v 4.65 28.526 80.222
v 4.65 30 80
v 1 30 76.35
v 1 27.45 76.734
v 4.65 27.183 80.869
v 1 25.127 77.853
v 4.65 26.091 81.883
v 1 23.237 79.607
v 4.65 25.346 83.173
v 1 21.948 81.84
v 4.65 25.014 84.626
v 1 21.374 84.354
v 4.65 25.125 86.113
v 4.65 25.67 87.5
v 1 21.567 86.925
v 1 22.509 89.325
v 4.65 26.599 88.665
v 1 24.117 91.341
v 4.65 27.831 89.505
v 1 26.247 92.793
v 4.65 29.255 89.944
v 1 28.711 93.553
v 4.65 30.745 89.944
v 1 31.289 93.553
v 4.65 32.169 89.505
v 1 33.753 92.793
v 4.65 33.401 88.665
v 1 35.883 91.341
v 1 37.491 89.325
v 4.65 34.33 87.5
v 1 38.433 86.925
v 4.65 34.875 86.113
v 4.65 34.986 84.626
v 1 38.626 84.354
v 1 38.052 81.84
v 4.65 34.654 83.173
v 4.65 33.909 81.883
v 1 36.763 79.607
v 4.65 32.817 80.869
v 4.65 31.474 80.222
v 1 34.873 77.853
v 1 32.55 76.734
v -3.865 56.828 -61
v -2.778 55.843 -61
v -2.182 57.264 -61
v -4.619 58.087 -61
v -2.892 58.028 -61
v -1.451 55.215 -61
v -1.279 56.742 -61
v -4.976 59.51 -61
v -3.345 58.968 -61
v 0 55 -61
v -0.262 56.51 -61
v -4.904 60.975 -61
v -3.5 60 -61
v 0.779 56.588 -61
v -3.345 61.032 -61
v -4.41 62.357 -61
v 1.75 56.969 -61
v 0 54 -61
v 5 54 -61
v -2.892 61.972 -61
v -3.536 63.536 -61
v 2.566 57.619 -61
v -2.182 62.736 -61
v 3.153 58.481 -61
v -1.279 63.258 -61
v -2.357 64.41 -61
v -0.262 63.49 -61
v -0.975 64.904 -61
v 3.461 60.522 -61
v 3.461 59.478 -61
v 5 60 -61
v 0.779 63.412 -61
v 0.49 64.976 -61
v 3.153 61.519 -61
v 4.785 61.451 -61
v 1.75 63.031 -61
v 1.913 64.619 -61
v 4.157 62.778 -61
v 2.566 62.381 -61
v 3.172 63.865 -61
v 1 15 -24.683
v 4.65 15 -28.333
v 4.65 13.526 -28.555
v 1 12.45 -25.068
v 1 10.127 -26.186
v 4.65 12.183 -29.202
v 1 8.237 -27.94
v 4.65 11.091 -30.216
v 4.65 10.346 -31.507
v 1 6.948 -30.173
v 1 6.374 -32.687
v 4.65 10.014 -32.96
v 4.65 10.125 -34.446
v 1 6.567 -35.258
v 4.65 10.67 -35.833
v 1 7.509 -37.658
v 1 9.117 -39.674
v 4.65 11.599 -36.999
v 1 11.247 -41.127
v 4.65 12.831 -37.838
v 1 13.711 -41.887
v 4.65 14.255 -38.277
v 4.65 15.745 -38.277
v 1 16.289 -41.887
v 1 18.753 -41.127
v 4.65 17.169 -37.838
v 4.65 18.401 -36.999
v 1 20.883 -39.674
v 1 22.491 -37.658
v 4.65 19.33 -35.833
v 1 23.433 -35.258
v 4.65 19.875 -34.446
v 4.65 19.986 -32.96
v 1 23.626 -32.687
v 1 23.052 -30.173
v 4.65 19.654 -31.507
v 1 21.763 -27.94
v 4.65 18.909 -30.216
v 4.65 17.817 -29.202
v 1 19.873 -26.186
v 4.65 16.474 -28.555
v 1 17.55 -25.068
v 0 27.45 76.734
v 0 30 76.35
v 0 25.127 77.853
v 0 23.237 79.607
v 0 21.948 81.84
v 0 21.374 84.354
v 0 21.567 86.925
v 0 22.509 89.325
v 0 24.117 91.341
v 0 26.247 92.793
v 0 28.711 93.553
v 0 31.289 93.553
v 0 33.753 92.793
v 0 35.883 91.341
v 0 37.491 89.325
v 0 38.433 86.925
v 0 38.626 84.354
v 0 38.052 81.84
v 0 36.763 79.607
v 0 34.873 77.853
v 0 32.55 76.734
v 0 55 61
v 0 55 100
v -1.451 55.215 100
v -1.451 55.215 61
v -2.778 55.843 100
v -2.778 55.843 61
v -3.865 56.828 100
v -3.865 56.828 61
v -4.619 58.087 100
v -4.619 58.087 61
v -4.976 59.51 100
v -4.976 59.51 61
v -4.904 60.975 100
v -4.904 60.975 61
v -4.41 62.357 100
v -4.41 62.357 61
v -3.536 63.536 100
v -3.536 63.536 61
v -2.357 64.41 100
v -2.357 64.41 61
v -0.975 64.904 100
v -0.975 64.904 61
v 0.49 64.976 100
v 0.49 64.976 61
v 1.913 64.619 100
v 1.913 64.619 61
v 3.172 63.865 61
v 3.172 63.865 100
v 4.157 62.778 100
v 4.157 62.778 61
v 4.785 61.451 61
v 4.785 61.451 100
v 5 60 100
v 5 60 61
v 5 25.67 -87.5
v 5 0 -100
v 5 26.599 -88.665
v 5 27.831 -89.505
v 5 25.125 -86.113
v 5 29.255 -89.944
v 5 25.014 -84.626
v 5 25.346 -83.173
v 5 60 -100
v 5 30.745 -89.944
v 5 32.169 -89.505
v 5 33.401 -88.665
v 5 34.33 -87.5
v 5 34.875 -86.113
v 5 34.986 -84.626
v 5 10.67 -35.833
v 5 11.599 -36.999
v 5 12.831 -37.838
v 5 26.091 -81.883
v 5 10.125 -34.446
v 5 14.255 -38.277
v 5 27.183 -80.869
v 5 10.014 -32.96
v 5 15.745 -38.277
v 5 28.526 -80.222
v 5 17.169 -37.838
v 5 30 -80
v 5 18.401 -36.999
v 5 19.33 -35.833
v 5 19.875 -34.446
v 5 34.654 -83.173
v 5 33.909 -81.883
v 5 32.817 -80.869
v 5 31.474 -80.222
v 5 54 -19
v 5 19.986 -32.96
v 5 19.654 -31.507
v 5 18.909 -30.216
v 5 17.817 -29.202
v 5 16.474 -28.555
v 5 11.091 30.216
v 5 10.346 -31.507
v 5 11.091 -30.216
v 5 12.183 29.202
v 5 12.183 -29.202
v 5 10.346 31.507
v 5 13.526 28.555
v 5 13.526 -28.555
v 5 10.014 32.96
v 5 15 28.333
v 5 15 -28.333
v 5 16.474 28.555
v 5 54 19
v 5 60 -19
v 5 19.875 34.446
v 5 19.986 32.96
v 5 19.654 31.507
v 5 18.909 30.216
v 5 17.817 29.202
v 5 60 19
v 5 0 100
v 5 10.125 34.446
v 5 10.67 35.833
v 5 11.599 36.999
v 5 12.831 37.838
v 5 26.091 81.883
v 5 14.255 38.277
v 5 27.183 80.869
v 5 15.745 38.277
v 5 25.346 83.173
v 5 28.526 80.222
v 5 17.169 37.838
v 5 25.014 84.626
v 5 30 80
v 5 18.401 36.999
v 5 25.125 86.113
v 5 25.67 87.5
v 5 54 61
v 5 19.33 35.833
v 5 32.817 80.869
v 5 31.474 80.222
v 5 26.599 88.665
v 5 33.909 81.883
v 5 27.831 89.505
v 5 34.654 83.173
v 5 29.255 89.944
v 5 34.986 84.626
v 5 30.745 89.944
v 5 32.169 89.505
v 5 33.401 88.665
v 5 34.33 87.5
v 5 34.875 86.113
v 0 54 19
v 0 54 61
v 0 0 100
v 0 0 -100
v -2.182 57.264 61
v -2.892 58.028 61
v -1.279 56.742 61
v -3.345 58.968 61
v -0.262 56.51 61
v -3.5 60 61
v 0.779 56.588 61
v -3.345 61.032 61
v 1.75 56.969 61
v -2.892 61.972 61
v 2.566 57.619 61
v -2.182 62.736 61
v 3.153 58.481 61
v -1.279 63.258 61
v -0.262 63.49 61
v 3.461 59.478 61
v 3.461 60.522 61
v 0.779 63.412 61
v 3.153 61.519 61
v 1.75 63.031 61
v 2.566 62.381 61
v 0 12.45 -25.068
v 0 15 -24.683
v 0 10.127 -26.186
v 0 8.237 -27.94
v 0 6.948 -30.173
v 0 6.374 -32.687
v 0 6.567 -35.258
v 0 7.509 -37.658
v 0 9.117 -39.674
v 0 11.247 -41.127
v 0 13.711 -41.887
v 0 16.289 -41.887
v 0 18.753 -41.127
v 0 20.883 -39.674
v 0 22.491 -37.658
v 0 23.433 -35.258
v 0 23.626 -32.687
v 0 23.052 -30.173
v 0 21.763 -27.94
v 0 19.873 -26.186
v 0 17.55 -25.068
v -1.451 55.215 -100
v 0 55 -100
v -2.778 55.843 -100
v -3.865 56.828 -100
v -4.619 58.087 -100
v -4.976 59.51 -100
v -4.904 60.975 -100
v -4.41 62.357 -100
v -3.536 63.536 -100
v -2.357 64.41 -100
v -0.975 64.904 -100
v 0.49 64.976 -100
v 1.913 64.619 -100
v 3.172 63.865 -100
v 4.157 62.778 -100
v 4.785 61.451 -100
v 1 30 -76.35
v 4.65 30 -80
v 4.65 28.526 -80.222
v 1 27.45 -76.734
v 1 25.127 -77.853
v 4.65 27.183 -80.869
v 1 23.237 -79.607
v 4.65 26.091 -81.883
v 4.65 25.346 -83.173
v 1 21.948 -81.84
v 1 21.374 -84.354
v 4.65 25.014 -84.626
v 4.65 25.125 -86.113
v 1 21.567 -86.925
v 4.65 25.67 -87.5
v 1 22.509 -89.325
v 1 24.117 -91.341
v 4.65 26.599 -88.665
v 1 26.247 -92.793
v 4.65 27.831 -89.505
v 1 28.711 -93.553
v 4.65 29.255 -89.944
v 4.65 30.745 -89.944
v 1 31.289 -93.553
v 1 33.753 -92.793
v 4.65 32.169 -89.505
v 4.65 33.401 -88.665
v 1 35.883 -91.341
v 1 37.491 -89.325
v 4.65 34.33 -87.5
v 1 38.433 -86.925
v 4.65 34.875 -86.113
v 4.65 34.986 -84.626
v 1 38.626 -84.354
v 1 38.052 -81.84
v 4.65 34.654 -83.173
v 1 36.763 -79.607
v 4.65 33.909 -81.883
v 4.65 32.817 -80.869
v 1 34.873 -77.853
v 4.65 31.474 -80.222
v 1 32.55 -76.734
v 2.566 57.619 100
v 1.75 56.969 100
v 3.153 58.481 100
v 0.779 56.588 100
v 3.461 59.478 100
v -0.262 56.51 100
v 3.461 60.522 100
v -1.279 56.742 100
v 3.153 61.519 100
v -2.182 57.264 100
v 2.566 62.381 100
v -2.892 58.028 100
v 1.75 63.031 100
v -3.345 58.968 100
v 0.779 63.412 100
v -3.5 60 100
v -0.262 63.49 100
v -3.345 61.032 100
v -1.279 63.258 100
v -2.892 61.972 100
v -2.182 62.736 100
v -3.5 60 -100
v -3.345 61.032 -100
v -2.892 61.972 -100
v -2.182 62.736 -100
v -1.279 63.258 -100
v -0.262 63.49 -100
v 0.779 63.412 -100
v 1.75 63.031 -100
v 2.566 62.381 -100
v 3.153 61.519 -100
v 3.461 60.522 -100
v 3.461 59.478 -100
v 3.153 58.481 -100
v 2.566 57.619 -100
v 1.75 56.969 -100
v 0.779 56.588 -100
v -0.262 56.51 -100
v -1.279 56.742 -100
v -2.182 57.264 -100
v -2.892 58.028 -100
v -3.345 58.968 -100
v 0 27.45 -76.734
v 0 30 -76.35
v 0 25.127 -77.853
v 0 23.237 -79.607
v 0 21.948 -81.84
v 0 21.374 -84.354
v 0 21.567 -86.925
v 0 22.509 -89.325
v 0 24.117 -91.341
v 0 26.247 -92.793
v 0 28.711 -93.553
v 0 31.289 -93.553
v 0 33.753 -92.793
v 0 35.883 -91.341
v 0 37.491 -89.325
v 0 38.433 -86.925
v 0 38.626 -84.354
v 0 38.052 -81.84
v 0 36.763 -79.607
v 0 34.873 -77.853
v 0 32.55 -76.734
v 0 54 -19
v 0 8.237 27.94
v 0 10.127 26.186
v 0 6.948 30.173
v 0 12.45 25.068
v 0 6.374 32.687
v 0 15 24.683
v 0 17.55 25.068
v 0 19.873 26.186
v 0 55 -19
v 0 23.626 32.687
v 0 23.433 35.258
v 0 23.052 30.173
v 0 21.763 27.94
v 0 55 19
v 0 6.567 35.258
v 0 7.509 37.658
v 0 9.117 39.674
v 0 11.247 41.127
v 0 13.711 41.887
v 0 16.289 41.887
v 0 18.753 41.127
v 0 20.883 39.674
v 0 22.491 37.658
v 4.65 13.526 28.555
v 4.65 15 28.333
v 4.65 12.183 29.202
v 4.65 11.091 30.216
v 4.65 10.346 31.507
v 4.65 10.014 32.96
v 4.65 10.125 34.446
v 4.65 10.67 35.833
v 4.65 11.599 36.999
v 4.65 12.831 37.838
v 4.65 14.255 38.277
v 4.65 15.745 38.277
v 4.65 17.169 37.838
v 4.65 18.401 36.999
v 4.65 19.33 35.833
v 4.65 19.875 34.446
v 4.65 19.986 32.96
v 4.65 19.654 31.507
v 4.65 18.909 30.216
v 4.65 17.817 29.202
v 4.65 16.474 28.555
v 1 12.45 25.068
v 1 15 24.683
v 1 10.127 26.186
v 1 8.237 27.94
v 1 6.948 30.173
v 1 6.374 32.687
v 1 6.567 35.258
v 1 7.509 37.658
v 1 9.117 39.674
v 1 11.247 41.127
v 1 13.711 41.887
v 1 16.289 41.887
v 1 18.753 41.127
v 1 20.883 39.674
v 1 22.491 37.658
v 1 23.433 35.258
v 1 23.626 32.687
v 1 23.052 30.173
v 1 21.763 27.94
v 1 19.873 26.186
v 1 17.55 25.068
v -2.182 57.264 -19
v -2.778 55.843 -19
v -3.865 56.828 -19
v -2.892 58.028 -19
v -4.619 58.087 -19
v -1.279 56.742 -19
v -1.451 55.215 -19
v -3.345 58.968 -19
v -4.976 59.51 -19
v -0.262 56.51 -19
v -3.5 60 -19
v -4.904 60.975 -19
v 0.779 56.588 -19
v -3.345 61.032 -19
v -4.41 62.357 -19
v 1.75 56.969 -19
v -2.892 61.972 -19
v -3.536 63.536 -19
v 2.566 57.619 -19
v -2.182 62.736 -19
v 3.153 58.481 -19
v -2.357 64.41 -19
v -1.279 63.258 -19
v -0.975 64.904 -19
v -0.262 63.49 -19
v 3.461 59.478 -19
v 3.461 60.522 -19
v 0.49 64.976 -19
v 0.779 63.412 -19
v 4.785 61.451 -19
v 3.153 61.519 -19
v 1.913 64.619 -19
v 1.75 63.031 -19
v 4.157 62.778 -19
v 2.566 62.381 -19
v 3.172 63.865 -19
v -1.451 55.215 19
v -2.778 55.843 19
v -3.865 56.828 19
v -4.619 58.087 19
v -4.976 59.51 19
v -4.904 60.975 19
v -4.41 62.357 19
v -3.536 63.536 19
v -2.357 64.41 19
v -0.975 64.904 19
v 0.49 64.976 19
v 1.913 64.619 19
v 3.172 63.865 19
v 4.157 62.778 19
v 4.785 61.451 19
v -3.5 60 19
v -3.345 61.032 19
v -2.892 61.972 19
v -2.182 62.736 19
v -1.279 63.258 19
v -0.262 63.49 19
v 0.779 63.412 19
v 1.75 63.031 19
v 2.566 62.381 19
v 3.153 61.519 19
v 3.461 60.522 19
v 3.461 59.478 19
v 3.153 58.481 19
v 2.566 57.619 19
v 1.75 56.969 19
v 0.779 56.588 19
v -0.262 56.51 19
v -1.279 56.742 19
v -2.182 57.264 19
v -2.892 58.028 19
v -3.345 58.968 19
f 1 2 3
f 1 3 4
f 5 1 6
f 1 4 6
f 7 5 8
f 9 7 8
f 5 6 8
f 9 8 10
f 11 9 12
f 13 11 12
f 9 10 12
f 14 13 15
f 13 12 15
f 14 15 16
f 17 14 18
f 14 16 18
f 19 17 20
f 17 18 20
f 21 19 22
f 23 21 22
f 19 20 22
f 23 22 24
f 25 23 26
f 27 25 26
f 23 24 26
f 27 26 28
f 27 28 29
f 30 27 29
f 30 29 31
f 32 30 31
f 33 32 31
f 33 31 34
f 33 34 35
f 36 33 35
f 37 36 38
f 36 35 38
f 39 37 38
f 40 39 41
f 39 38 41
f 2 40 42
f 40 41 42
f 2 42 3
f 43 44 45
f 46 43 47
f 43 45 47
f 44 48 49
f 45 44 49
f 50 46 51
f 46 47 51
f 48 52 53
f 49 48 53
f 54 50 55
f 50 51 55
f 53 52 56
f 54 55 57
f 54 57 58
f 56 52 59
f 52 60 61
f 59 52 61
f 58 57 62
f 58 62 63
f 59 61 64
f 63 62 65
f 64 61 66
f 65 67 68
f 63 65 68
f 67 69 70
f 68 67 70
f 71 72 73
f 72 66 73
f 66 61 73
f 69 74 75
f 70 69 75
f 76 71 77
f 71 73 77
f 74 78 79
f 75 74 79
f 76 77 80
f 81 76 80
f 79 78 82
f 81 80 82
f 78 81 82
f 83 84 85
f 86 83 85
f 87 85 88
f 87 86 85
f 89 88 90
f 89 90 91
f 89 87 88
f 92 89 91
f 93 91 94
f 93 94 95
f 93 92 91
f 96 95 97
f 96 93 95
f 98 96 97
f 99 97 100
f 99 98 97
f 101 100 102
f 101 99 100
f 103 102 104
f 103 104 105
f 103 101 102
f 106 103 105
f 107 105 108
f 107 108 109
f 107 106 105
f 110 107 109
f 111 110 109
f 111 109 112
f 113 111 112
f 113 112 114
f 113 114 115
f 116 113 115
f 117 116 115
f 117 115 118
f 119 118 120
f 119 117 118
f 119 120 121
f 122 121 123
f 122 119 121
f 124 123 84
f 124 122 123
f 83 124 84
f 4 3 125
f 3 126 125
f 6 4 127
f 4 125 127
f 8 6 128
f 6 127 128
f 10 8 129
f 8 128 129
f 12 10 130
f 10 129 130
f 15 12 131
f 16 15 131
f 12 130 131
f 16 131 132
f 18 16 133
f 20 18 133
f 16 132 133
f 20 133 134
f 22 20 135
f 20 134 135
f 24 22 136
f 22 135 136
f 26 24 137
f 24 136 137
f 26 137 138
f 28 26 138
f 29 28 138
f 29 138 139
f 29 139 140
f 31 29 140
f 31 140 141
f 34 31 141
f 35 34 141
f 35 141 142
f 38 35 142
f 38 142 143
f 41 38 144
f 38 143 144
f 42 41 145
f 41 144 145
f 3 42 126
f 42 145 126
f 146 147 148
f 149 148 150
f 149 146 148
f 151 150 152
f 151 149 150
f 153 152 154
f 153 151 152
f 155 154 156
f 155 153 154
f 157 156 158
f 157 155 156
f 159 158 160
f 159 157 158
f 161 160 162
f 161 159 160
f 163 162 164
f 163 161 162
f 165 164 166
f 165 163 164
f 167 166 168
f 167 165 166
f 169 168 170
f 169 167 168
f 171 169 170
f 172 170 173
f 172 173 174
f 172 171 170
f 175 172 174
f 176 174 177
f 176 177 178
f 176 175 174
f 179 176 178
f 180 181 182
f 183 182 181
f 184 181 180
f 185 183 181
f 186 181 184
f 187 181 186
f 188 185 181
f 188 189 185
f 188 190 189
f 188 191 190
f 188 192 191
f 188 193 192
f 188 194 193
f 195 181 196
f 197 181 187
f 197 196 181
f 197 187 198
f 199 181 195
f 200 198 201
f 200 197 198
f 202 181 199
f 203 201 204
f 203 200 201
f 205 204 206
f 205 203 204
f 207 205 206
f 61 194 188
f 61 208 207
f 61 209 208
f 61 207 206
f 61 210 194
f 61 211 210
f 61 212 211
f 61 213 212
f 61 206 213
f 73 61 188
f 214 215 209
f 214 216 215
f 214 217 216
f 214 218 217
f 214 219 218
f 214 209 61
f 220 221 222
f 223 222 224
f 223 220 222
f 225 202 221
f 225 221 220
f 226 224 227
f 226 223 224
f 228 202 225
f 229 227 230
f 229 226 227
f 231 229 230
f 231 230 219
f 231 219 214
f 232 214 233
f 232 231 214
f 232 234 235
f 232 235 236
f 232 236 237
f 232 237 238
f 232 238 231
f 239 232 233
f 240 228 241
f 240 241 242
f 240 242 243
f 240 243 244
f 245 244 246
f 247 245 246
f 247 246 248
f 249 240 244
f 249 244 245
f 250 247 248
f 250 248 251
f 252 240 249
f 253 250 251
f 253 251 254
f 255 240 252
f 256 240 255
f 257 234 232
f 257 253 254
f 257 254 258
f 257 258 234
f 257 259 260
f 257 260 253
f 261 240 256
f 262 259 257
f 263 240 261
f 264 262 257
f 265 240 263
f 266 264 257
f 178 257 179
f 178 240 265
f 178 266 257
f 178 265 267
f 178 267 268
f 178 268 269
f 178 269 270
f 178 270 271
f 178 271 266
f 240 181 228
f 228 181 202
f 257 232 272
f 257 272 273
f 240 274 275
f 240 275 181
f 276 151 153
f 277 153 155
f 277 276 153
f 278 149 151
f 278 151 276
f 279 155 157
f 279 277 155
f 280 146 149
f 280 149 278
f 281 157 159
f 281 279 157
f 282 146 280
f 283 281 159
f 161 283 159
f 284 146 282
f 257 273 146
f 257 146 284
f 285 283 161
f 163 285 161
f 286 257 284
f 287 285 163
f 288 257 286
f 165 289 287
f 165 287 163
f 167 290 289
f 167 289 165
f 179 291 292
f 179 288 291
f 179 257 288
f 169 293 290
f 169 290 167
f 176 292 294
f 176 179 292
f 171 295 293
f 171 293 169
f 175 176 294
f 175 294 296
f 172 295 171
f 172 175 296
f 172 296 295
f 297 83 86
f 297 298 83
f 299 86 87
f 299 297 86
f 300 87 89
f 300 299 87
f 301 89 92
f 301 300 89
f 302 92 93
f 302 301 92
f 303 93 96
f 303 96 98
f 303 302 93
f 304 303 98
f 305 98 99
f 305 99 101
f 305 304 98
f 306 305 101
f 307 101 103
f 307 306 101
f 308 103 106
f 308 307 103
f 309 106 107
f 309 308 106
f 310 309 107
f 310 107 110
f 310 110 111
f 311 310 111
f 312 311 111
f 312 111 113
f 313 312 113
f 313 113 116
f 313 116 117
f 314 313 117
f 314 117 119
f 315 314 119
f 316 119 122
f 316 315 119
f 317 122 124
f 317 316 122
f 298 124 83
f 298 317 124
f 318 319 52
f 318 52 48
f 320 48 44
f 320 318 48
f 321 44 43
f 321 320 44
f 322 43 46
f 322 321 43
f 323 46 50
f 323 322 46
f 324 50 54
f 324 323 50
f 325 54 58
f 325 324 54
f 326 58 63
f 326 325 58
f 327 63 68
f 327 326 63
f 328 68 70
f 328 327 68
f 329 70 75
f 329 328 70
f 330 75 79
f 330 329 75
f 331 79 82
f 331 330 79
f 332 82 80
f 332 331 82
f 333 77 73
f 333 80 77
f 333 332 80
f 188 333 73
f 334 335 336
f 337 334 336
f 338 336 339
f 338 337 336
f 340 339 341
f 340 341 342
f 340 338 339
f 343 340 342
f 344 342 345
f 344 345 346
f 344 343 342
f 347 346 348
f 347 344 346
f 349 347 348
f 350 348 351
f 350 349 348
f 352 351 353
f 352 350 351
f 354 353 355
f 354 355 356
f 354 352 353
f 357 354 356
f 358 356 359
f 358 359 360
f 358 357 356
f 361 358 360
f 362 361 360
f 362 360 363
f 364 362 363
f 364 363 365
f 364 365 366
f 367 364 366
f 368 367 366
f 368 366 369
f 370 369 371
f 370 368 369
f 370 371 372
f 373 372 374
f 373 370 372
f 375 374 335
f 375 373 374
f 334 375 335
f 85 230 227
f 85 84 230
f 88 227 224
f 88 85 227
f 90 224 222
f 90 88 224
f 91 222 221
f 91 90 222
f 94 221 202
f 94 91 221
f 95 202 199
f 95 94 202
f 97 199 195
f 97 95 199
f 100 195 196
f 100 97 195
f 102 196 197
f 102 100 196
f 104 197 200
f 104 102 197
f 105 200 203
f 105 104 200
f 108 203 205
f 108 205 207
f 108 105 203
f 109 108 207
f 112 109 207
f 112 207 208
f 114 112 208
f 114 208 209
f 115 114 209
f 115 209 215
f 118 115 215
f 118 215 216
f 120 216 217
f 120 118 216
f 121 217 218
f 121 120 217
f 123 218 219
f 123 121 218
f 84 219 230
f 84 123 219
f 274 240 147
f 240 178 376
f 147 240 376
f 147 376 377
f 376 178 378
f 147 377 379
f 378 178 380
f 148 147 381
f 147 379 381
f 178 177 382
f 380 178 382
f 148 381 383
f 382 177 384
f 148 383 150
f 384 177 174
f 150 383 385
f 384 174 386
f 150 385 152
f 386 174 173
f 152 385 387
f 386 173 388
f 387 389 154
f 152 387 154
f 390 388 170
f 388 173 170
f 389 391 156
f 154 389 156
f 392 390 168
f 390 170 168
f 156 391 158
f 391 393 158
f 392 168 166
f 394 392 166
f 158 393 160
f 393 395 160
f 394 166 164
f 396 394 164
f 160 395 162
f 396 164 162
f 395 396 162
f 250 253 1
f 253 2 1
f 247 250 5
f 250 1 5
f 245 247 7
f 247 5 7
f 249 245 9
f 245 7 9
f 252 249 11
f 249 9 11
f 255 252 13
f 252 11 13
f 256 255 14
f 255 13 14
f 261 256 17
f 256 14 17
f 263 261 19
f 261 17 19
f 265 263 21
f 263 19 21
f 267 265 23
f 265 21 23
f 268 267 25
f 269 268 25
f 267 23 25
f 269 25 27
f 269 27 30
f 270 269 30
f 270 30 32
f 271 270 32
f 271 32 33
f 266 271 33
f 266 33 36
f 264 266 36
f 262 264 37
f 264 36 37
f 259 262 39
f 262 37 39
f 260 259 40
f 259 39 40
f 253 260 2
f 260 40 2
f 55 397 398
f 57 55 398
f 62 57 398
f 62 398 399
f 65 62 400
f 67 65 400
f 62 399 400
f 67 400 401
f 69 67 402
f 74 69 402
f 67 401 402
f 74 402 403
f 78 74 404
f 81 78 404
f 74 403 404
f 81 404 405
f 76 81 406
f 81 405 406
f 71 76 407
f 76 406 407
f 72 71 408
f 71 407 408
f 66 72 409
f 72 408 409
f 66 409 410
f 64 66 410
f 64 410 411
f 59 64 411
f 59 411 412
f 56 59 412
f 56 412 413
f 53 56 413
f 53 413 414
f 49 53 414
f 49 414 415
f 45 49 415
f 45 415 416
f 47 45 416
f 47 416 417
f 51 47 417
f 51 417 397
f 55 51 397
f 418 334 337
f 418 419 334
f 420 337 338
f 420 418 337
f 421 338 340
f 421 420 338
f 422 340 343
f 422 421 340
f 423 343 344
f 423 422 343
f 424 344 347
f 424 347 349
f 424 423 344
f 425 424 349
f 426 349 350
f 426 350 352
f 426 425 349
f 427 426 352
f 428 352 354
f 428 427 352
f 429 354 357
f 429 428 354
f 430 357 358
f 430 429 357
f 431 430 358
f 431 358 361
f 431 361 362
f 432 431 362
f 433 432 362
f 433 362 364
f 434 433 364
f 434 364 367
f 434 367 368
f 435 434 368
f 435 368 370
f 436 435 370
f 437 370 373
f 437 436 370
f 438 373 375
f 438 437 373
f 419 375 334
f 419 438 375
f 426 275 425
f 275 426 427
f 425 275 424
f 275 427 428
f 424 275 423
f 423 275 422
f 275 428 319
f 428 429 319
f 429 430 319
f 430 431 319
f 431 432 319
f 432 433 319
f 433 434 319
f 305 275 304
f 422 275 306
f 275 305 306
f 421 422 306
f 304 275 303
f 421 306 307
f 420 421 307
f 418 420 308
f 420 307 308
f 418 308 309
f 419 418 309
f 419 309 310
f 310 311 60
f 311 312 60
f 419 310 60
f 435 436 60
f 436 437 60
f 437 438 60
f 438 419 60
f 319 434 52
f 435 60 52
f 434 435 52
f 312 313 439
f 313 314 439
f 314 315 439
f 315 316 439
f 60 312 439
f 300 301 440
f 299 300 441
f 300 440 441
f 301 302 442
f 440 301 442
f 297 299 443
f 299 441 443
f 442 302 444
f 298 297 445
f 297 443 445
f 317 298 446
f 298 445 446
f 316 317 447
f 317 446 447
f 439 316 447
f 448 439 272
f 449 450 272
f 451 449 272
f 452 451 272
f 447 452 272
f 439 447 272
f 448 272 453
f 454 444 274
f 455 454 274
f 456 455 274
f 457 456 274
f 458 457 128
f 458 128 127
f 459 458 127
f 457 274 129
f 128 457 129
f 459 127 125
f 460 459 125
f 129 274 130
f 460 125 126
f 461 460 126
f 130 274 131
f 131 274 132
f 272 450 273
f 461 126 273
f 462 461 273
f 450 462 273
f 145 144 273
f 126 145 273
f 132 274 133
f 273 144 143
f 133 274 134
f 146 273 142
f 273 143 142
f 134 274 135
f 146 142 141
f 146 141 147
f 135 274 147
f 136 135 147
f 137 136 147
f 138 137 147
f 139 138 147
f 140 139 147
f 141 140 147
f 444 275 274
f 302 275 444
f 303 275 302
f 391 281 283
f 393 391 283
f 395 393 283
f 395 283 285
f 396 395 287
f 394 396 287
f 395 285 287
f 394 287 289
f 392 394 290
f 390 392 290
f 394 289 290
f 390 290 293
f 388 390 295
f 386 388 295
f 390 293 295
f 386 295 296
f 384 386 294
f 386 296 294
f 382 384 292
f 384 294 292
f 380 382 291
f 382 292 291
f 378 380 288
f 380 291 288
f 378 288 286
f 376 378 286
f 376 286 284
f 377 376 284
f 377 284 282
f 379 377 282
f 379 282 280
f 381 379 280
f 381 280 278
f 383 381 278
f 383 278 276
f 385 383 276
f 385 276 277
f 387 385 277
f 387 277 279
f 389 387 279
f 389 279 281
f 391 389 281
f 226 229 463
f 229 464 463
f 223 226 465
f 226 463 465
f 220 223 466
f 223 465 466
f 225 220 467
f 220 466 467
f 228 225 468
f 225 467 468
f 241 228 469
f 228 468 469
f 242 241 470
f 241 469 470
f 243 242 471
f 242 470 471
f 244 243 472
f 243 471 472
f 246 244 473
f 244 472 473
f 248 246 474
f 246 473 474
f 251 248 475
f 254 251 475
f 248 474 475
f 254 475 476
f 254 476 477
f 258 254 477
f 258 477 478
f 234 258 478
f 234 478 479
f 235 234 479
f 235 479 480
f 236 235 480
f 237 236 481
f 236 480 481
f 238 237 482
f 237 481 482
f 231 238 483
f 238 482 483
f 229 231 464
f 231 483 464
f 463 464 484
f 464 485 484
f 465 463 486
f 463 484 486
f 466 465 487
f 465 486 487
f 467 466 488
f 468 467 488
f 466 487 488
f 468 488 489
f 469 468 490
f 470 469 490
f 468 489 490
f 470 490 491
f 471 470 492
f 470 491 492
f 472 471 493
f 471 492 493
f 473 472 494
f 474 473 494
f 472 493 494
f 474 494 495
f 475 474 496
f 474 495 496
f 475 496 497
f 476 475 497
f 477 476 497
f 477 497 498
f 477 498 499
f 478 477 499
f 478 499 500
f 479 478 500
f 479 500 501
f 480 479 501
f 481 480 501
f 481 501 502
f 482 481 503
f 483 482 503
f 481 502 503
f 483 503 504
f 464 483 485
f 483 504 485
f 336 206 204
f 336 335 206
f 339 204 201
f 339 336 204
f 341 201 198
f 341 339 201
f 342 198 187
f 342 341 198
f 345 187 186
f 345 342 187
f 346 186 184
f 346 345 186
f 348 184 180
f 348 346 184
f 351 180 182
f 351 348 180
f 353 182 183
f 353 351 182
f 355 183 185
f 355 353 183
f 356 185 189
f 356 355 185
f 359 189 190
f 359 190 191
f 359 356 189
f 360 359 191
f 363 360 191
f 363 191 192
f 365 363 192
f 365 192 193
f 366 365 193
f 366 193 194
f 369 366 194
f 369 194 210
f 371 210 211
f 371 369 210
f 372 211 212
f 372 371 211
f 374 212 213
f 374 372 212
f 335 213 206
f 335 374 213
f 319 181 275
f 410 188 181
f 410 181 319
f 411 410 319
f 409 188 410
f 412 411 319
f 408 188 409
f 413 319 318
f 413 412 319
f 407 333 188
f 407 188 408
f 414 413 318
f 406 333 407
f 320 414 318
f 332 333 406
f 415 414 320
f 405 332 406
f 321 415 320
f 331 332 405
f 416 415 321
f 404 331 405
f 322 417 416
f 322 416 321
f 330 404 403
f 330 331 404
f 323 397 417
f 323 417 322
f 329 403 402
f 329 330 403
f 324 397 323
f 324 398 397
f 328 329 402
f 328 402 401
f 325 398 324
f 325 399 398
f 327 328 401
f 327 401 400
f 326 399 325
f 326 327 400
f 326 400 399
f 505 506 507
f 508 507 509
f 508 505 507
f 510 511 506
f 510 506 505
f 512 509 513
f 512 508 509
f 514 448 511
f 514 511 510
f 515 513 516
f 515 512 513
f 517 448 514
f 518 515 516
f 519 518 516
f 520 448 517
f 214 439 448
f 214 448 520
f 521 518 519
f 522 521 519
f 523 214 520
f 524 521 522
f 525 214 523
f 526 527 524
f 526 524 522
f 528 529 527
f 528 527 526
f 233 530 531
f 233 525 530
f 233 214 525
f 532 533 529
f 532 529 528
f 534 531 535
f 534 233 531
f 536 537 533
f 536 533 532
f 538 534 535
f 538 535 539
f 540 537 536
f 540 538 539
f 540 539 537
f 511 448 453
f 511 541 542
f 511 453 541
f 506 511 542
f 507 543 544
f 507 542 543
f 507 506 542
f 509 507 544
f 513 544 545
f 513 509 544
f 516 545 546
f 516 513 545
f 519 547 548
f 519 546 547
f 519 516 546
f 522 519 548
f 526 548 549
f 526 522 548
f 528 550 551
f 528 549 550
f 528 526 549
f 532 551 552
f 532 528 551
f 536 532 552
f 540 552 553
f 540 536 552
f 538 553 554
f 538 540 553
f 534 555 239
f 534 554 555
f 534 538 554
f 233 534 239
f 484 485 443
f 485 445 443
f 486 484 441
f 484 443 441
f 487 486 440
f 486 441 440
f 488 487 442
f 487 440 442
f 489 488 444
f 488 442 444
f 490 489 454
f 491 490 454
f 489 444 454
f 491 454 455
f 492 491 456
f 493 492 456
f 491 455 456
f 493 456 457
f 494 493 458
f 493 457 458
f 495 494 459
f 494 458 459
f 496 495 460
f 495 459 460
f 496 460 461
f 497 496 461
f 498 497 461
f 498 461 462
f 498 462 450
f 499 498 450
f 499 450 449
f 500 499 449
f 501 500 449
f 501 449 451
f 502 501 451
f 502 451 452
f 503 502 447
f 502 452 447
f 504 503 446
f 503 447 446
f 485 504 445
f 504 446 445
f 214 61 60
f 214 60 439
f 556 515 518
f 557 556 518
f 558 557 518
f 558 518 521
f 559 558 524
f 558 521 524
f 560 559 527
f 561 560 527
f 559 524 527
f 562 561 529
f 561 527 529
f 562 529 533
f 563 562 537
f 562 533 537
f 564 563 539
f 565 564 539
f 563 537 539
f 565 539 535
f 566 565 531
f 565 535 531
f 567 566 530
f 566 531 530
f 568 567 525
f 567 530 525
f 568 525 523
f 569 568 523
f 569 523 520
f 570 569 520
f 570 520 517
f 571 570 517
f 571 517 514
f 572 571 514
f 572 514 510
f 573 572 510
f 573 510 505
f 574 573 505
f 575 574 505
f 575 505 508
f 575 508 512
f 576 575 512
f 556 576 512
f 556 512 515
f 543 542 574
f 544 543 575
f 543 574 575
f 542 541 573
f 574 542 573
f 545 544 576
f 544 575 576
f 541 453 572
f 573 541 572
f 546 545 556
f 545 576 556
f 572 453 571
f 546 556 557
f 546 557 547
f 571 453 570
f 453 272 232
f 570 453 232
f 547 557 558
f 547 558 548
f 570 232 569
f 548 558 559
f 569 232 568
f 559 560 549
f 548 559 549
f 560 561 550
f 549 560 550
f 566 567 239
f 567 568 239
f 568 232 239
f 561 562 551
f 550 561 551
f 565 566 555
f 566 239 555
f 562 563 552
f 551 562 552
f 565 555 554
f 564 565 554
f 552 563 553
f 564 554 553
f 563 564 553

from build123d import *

# Parameters (mm, degrees)
SKETCH1_W                                      = 5
SKETCH1_H                                      = 60
EXTRUDE_THIN1_DEPTH                            = 100
SKETCH2_R                                      = 5
SKETCH3_R                                      = 3.5
CUT_EXTRUDE1_DEPTH                             = 211.35683968
CSK_FOR_M8_FLAT_HEAD_MACHINE_SCREW1_AT_2_COUNT = 2
CSK_FOR_M8_FLAT_HEAD_MACHINE_SCREW1_AT_2_PITCH = 53.800041305
F_2_CUTS_DEPTH                                 = 120.373363863
F_2_CUTS_DEPTH_BACK                            = 120.373363863
SKETCH8_W                                      = 42
SKETCH8_H                                      = 11


with BuildPart() as part:
    # Sketch1 → Extrude-Thin1 (new, symmetric)
    with BuildSketch(Plane.XY):
        with Locations((2.5, 30)):
            Rectangle(SKETCH1_W, SKETCH1_H)
    extrude(amount=EXTRUDE_THIN1_DEPTH, both=True)

    # Sweep1: sweep along a curve in space
    with BuildLine() as sweep1_path:
        Line((0, 60, 100), (0, 60, -100))
    # Sketch2 → Sweep1 (sweep)
    with BuildSketch(Plane(origin=(0, 0, -100), x_dir=(-1, 0, 0), z_dir=(0, 0, -1))):
        with Locations((0, 60)):
            Circle(SKETCH2_R)
    sweep(path=sweep1_path.line)

    # Sketch3 → Cut-Extrude1 (cut, through all)
    with BuildSketch(Plane(origin=(0, 0, -100), x_dir=(-1, 0, 0), z_dir=(0, 0, -1))):
        with Locations((0, 60)):
            Circle(SKETCH3_R)
    extrude(amount=-CUT_EXTRUDE1_DEPTH, mode=Mode.SUBTRACT)

    # Sketch4 → CSK for M8 Flat Head Machine Screw1 (revolve, cut)
    with BuildSketch(Plane(origin=(0, 30, -85), x_dir=(0, 0, 1), z_dir=(0, 1, 0))):
        Polygon((0, 0), (0, 5), (5, 5), (5, 4.65), (8.65, 1), (8.65, 0), align=None)
    csk_for_m8_flat_head_machine_screw1 = revolve(axis=Axis((-6.35, 30, -85), (1, 0, 0)), mode=Mode.SUBTRACT)

    # CSK for M8 Flat Head Machine Screw1 at 2: CSK for M8 Flat Head Machine Screw1 ×2
    with Locations(*[Vector(0, -0.2788101948639552, 0.9603462267536241) * (i * CSK_FOR_M8_FLAT_HEAD_MACHINE_SCREW1_AT_2_PITCH) for i in range(1, CSK_FOR_M8_FLAT_HEAD_MACHINE_SCREW1_AT_2_COUNT)]):
        add(csk_for_m8_flat_head_machine_screw1, mode=Mode.SUBTRACT)

    # Mirror1: CSK for M8 Flat Head Machine Screw1 across plane
    add(csk_for_m8_flat_head_machine_screw1.mirror(Plane.XY), mode=Mode.SUBTRACT)

    # Mirror1 copy 1 sketch → Mirror1 copy 1 (revolve, cut)
    with BuildSketch(Plane(origin=(0, 15, 33.333333333), x_dir=(0, 0, -1), z_dir=(0, 1, 0))):
        Polygon((0, 0), (0, -5), (5, -5), (5, -4.65), (8.65, -1), (8.65, 0), align=None)
    revolve(axis=Axis((-6.35, 15, 33.333333333), (-1, 0, 0)), mode=Mode.SUBTRACT)

    # Sketch8 → 2 cuts (cut, two sides: drawn at the far end of the back side and taken through both)
    with BuildSketch(Plane.ZY.offset(-F_2_CUTS_DEPTH_BACK)):
        with Locations((-40, 59.5)):
            Rectangle(SKETCH8_W, SKETCH8_H)
        with Locations((40, 59.5)):
            Rectangle(SKETCH8_W, SKETCH8_H)
    extrude(amount=F_2_CUTS_DEPTH + F_2_CUTS_DEPTH_BACK, mode=Mode.SUBTRACT)


solid = part.part
